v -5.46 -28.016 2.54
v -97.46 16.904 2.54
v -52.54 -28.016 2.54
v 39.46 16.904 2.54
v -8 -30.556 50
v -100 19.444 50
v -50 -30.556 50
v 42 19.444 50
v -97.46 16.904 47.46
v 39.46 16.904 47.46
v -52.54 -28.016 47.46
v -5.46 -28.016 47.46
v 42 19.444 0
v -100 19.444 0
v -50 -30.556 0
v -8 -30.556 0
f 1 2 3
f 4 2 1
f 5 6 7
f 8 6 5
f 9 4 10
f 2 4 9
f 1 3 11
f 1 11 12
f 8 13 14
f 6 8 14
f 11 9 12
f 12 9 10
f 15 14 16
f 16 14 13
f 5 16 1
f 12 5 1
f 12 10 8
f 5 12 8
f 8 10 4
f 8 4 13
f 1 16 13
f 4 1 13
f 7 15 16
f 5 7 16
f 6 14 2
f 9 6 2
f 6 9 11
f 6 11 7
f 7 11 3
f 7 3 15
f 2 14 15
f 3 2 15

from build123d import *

# Parameters (mm, degrees)
F0_W     = 42
F0_H     = 50
F1_DEPTH = 50
F2_T     = -2.54


with BuildPart() as f1:
    # F0 (on Top) → F1 (new body)
    with BuildSketch(Plane.XY):
        Polygon((-100, 19.444444), (-50, -30.555556), (-50, 19.444444), align=None)
        with Locations((-29, -5.555556)):
            Rectangle(F0_W, F0_H)
        Polygon((-8, 19.444444), (-8, -30.555556), (42, 19.444444), align=None)
    extrude(amount=F1_DEPTH)

    # F2
    f2_openings = [f1.faces().sort_by_distance(p)[0] for p in [
        (17, -5.555556, 25),
        (-75, -5.555556, 25),
    ]]
    offset(amount=F2_T, openings=f2_openings)


solid = f1.part
